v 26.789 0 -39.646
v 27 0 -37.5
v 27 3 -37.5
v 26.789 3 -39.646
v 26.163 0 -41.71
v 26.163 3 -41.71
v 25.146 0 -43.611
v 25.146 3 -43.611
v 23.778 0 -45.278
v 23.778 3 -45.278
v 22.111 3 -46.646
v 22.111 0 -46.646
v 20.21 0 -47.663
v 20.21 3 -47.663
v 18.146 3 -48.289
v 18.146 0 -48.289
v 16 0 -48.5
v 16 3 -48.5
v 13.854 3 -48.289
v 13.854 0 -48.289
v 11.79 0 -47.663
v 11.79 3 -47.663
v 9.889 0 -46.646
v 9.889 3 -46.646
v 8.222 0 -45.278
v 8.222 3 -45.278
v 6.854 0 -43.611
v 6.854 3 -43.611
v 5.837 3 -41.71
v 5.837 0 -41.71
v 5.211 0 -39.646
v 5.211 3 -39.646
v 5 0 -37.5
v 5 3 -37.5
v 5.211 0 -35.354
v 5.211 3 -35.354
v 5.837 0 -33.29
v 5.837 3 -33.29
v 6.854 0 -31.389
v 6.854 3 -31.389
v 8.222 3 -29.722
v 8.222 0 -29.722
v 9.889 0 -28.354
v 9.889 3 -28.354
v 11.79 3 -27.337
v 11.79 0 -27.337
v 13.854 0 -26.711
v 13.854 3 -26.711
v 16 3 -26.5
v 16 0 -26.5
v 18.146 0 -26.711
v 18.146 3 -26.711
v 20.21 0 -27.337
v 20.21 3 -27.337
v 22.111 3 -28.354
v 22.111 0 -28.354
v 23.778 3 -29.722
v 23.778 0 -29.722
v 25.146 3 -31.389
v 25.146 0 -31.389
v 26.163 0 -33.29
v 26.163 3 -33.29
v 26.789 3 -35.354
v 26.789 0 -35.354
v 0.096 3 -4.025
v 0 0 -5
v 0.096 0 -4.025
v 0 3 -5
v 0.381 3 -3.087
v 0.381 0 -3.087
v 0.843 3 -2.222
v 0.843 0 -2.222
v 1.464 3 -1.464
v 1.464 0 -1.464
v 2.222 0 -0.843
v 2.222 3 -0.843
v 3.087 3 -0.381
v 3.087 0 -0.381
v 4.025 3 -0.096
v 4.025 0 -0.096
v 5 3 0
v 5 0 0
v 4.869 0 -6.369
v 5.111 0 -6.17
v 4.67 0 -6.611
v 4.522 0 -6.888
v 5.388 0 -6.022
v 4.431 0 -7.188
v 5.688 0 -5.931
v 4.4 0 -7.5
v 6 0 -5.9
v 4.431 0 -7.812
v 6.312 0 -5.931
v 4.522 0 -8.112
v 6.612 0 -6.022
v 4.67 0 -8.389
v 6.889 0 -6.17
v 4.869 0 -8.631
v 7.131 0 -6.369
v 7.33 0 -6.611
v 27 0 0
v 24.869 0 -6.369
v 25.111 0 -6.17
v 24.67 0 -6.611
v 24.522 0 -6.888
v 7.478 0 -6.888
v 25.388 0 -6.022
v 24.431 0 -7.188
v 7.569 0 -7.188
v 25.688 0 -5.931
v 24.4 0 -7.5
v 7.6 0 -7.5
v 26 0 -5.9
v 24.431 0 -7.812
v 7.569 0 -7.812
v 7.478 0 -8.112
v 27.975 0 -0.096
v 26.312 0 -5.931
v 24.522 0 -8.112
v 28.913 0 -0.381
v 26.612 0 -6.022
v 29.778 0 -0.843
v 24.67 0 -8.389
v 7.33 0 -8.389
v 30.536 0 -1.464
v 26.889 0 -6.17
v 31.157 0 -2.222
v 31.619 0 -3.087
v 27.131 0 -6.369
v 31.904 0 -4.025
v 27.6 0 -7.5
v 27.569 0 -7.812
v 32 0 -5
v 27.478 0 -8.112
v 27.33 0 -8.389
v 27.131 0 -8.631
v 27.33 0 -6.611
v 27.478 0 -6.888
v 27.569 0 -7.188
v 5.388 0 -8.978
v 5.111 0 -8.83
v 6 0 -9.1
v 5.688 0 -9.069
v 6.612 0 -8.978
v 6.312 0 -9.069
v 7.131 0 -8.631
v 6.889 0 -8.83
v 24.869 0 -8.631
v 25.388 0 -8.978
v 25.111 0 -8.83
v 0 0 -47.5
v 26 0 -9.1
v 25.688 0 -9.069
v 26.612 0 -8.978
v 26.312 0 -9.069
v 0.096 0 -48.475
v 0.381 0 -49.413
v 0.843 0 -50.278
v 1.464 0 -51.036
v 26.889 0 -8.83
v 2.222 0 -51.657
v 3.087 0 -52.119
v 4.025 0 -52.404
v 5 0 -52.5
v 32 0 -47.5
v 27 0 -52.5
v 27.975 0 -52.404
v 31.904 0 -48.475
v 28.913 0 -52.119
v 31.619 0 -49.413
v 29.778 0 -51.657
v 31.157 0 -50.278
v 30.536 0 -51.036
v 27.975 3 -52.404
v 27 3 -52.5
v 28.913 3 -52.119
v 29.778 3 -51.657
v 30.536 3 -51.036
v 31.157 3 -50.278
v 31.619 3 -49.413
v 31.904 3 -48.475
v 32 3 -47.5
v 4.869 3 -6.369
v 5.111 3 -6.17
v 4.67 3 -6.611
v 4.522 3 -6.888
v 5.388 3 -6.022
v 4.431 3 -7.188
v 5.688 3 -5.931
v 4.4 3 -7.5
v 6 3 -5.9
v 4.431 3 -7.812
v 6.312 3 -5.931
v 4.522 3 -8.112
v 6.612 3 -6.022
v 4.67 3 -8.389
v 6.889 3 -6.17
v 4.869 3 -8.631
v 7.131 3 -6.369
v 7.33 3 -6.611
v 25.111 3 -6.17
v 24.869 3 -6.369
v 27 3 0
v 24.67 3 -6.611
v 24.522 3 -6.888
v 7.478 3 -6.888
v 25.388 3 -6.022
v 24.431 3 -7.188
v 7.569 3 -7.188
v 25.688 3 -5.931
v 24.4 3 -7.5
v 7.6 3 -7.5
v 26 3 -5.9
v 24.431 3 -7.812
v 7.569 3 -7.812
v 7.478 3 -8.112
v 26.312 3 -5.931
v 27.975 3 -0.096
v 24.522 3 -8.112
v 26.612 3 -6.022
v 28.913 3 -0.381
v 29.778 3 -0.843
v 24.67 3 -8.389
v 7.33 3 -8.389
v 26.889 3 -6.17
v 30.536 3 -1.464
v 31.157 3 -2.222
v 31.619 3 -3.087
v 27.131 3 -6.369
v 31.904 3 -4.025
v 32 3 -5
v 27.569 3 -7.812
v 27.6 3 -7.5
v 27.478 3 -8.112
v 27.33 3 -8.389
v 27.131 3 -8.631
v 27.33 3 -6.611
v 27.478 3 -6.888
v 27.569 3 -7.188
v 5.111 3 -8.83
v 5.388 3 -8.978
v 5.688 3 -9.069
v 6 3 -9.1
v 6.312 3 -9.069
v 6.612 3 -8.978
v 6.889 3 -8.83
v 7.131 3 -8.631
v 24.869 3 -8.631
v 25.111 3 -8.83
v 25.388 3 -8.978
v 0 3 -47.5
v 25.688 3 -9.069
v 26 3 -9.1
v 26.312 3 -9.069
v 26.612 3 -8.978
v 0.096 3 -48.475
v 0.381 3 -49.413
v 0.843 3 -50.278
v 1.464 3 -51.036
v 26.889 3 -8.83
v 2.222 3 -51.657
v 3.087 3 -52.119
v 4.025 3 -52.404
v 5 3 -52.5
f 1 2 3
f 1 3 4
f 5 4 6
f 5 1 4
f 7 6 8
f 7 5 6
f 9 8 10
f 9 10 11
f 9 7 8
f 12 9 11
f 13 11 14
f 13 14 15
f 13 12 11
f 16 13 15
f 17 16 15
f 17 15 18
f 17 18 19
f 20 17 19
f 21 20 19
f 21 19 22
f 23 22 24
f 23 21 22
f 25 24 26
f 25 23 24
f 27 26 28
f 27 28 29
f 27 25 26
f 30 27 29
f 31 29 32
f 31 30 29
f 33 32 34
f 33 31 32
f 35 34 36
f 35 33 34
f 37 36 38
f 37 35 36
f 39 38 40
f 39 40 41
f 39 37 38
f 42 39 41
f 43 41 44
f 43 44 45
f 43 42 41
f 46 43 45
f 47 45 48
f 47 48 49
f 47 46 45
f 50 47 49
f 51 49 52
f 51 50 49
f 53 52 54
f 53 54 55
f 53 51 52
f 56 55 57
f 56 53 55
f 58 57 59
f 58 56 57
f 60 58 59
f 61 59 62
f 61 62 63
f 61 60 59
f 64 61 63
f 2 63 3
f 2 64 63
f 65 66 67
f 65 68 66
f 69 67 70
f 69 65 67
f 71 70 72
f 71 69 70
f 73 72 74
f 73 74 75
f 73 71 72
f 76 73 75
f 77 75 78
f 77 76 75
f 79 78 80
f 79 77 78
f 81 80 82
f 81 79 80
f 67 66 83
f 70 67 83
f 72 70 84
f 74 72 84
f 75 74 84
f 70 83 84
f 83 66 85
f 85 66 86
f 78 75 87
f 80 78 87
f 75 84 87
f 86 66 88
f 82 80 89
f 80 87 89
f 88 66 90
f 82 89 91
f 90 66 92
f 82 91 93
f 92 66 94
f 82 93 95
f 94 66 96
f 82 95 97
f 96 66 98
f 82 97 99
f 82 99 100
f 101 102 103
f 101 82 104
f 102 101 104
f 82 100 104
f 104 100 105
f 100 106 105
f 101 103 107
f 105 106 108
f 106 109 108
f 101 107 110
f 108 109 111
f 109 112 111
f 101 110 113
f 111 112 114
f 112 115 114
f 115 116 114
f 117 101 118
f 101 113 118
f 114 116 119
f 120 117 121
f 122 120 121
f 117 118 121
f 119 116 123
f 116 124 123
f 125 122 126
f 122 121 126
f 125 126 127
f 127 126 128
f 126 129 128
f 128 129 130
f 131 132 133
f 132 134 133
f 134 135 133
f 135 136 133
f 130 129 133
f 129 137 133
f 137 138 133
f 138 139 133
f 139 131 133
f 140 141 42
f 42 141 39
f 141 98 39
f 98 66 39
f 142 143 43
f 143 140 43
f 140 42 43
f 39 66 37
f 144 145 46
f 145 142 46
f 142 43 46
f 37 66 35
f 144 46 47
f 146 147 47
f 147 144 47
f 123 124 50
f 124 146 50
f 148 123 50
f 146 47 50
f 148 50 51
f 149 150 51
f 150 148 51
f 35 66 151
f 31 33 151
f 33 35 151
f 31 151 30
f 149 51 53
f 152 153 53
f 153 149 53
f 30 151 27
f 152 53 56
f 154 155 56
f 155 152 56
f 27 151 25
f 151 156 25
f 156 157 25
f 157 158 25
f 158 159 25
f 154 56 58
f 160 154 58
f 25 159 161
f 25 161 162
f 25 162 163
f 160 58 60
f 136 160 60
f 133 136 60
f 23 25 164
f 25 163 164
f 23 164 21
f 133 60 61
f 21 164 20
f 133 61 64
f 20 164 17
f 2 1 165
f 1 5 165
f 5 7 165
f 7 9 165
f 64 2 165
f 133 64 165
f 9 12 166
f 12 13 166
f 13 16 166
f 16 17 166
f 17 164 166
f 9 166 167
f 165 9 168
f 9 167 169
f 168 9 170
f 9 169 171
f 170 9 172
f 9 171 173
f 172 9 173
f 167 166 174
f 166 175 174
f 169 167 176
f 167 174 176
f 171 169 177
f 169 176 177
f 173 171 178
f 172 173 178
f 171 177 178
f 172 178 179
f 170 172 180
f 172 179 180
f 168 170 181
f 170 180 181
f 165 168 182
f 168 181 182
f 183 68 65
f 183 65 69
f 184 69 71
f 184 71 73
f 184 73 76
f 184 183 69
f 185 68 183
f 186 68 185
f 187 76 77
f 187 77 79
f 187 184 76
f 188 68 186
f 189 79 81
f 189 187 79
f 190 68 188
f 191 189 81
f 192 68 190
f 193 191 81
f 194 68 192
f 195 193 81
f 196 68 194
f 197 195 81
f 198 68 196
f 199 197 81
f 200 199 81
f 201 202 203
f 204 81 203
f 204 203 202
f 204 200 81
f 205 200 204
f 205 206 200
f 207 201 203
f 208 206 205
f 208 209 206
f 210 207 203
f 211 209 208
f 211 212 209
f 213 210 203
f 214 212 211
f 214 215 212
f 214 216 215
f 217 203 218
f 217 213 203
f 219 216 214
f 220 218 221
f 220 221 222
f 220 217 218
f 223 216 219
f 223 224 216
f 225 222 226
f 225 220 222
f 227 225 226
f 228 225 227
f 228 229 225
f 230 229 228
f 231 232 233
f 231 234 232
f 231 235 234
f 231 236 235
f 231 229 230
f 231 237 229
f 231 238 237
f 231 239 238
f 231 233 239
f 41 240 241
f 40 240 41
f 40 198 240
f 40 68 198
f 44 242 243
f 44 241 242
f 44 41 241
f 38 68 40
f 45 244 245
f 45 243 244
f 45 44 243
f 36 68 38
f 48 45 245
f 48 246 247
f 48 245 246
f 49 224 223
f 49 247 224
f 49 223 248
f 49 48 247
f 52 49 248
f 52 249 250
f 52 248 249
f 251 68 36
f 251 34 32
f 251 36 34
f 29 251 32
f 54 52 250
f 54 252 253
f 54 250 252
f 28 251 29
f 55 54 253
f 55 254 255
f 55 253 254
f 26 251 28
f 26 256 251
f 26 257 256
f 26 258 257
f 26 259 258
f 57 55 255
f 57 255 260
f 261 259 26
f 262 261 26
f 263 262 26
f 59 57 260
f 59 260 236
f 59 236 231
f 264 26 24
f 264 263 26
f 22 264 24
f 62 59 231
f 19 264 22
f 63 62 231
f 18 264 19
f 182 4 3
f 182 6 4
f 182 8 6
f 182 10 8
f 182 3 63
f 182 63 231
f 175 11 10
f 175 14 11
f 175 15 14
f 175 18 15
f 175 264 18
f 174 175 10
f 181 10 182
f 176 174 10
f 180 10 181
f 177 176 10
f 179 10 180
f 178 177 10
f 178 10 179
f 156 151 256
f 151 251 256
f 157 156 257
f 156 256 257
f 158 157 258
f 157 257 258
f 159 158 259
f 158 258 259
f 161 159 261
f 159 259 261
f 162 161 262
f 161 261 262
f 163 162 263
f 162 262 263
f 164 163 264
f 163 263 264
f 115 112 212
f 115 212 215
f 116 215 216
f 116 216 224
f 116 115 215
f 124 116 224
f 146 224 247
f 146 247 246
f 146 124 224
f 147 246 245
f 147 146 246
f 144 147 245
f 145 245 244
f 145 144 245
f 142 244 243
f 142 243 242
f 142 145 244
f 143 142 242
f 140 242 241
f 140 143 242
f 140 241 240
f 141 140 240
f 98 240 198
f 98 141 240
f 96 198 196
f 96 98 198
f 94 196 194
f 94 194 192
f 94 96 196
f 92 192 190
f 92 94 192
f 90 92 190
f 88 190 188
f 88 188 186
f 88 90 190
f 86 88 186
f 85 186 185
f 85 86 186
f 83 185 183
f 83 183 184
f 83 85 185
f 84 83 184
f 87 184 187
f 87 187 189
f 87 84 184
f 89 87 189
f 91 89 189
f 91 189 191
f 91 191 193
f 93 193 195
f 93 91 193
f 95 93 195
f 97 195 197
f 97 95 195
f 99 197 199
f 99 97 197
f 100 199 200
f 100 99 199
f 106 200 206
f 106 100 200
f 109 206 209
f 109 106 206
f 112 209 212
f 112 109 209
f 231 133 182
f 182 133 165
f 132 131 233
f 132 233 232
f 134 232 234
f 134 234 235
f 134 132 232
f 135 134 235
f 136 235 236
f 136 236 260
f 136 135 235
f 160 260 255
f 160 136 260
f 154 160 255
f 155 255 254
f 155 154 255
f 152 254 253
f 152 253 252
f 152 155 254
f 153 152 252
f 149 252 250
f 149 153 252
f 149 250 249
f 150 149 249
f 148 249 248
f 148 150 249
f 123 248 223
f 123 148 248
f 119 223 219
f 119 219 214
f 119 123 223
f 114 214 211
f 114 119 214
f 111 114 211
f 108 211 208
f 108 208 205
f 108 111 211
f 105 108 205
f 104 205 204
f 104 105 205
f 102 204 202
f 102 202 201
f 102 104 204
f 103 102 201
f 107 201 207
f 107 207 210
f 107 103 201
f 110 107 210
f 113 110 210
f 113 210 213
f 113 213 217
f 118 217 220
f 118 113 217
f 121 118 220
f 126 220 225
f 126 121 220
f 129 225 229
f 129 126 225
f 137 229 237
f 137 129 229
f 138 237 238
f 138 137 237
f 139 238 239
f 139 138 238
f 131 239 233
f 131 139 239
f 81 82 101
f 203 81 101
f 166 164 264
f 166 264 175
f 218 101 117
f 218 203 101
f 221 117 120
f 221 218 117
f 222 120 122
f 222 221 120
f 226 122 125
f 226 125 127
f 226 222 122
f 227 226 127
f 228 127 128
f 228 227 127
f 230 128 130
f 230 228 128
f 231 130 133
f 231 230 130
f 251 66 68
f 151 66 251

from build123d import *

# Parameters (mm, degrees)
SKETCH1_W           = 32
SKETCH1_H           = 52.5
SKETCH1_R           = 11
SKETCH1_R_2         = 1.6
BOSS_EXTRUDE1_DEPTH = 3
FILLET1_R           = 5


with BuildPart() as part:
    # Sketch1 → Boss-Extrude1 (new body)
    with BuildSketch(Plane(origin=(0, 0, 0), x_dir=(1, 0, 0), z_dir=(0, 1, 0))):
        with Locations((16, 26.25)):
            Rectangle(SKETCH1_W, SKETCH1_H)
        with Locations((16, 37.5)):
            Circle(SKETCH1_R, mode=Mode.SUBTRACT)
        with Locations((6, 7.5)):
            Circle(SKETCH1_R_2, mode=Mode.SUBTRACT)
        with Locations((26, 7.5)):
            Circle(SKETCH1_R_2, mode=Mode.SUBTRACT)
    extrude(amount=BOSS_EXTRUDE1_DEPTH)

    # Fillet1
    fillet1_edges = [part.edges().sort_by_distance(p)[0] for p in [
        (0, 1.5, -52.5),
        (32, 1.5, -52.5),
        (32, 1.5, 0),
        (0, 1.5, 0),
    ]]
    fillet(fillet1_edges, radius=FILLET1_R)


solid = part.part
